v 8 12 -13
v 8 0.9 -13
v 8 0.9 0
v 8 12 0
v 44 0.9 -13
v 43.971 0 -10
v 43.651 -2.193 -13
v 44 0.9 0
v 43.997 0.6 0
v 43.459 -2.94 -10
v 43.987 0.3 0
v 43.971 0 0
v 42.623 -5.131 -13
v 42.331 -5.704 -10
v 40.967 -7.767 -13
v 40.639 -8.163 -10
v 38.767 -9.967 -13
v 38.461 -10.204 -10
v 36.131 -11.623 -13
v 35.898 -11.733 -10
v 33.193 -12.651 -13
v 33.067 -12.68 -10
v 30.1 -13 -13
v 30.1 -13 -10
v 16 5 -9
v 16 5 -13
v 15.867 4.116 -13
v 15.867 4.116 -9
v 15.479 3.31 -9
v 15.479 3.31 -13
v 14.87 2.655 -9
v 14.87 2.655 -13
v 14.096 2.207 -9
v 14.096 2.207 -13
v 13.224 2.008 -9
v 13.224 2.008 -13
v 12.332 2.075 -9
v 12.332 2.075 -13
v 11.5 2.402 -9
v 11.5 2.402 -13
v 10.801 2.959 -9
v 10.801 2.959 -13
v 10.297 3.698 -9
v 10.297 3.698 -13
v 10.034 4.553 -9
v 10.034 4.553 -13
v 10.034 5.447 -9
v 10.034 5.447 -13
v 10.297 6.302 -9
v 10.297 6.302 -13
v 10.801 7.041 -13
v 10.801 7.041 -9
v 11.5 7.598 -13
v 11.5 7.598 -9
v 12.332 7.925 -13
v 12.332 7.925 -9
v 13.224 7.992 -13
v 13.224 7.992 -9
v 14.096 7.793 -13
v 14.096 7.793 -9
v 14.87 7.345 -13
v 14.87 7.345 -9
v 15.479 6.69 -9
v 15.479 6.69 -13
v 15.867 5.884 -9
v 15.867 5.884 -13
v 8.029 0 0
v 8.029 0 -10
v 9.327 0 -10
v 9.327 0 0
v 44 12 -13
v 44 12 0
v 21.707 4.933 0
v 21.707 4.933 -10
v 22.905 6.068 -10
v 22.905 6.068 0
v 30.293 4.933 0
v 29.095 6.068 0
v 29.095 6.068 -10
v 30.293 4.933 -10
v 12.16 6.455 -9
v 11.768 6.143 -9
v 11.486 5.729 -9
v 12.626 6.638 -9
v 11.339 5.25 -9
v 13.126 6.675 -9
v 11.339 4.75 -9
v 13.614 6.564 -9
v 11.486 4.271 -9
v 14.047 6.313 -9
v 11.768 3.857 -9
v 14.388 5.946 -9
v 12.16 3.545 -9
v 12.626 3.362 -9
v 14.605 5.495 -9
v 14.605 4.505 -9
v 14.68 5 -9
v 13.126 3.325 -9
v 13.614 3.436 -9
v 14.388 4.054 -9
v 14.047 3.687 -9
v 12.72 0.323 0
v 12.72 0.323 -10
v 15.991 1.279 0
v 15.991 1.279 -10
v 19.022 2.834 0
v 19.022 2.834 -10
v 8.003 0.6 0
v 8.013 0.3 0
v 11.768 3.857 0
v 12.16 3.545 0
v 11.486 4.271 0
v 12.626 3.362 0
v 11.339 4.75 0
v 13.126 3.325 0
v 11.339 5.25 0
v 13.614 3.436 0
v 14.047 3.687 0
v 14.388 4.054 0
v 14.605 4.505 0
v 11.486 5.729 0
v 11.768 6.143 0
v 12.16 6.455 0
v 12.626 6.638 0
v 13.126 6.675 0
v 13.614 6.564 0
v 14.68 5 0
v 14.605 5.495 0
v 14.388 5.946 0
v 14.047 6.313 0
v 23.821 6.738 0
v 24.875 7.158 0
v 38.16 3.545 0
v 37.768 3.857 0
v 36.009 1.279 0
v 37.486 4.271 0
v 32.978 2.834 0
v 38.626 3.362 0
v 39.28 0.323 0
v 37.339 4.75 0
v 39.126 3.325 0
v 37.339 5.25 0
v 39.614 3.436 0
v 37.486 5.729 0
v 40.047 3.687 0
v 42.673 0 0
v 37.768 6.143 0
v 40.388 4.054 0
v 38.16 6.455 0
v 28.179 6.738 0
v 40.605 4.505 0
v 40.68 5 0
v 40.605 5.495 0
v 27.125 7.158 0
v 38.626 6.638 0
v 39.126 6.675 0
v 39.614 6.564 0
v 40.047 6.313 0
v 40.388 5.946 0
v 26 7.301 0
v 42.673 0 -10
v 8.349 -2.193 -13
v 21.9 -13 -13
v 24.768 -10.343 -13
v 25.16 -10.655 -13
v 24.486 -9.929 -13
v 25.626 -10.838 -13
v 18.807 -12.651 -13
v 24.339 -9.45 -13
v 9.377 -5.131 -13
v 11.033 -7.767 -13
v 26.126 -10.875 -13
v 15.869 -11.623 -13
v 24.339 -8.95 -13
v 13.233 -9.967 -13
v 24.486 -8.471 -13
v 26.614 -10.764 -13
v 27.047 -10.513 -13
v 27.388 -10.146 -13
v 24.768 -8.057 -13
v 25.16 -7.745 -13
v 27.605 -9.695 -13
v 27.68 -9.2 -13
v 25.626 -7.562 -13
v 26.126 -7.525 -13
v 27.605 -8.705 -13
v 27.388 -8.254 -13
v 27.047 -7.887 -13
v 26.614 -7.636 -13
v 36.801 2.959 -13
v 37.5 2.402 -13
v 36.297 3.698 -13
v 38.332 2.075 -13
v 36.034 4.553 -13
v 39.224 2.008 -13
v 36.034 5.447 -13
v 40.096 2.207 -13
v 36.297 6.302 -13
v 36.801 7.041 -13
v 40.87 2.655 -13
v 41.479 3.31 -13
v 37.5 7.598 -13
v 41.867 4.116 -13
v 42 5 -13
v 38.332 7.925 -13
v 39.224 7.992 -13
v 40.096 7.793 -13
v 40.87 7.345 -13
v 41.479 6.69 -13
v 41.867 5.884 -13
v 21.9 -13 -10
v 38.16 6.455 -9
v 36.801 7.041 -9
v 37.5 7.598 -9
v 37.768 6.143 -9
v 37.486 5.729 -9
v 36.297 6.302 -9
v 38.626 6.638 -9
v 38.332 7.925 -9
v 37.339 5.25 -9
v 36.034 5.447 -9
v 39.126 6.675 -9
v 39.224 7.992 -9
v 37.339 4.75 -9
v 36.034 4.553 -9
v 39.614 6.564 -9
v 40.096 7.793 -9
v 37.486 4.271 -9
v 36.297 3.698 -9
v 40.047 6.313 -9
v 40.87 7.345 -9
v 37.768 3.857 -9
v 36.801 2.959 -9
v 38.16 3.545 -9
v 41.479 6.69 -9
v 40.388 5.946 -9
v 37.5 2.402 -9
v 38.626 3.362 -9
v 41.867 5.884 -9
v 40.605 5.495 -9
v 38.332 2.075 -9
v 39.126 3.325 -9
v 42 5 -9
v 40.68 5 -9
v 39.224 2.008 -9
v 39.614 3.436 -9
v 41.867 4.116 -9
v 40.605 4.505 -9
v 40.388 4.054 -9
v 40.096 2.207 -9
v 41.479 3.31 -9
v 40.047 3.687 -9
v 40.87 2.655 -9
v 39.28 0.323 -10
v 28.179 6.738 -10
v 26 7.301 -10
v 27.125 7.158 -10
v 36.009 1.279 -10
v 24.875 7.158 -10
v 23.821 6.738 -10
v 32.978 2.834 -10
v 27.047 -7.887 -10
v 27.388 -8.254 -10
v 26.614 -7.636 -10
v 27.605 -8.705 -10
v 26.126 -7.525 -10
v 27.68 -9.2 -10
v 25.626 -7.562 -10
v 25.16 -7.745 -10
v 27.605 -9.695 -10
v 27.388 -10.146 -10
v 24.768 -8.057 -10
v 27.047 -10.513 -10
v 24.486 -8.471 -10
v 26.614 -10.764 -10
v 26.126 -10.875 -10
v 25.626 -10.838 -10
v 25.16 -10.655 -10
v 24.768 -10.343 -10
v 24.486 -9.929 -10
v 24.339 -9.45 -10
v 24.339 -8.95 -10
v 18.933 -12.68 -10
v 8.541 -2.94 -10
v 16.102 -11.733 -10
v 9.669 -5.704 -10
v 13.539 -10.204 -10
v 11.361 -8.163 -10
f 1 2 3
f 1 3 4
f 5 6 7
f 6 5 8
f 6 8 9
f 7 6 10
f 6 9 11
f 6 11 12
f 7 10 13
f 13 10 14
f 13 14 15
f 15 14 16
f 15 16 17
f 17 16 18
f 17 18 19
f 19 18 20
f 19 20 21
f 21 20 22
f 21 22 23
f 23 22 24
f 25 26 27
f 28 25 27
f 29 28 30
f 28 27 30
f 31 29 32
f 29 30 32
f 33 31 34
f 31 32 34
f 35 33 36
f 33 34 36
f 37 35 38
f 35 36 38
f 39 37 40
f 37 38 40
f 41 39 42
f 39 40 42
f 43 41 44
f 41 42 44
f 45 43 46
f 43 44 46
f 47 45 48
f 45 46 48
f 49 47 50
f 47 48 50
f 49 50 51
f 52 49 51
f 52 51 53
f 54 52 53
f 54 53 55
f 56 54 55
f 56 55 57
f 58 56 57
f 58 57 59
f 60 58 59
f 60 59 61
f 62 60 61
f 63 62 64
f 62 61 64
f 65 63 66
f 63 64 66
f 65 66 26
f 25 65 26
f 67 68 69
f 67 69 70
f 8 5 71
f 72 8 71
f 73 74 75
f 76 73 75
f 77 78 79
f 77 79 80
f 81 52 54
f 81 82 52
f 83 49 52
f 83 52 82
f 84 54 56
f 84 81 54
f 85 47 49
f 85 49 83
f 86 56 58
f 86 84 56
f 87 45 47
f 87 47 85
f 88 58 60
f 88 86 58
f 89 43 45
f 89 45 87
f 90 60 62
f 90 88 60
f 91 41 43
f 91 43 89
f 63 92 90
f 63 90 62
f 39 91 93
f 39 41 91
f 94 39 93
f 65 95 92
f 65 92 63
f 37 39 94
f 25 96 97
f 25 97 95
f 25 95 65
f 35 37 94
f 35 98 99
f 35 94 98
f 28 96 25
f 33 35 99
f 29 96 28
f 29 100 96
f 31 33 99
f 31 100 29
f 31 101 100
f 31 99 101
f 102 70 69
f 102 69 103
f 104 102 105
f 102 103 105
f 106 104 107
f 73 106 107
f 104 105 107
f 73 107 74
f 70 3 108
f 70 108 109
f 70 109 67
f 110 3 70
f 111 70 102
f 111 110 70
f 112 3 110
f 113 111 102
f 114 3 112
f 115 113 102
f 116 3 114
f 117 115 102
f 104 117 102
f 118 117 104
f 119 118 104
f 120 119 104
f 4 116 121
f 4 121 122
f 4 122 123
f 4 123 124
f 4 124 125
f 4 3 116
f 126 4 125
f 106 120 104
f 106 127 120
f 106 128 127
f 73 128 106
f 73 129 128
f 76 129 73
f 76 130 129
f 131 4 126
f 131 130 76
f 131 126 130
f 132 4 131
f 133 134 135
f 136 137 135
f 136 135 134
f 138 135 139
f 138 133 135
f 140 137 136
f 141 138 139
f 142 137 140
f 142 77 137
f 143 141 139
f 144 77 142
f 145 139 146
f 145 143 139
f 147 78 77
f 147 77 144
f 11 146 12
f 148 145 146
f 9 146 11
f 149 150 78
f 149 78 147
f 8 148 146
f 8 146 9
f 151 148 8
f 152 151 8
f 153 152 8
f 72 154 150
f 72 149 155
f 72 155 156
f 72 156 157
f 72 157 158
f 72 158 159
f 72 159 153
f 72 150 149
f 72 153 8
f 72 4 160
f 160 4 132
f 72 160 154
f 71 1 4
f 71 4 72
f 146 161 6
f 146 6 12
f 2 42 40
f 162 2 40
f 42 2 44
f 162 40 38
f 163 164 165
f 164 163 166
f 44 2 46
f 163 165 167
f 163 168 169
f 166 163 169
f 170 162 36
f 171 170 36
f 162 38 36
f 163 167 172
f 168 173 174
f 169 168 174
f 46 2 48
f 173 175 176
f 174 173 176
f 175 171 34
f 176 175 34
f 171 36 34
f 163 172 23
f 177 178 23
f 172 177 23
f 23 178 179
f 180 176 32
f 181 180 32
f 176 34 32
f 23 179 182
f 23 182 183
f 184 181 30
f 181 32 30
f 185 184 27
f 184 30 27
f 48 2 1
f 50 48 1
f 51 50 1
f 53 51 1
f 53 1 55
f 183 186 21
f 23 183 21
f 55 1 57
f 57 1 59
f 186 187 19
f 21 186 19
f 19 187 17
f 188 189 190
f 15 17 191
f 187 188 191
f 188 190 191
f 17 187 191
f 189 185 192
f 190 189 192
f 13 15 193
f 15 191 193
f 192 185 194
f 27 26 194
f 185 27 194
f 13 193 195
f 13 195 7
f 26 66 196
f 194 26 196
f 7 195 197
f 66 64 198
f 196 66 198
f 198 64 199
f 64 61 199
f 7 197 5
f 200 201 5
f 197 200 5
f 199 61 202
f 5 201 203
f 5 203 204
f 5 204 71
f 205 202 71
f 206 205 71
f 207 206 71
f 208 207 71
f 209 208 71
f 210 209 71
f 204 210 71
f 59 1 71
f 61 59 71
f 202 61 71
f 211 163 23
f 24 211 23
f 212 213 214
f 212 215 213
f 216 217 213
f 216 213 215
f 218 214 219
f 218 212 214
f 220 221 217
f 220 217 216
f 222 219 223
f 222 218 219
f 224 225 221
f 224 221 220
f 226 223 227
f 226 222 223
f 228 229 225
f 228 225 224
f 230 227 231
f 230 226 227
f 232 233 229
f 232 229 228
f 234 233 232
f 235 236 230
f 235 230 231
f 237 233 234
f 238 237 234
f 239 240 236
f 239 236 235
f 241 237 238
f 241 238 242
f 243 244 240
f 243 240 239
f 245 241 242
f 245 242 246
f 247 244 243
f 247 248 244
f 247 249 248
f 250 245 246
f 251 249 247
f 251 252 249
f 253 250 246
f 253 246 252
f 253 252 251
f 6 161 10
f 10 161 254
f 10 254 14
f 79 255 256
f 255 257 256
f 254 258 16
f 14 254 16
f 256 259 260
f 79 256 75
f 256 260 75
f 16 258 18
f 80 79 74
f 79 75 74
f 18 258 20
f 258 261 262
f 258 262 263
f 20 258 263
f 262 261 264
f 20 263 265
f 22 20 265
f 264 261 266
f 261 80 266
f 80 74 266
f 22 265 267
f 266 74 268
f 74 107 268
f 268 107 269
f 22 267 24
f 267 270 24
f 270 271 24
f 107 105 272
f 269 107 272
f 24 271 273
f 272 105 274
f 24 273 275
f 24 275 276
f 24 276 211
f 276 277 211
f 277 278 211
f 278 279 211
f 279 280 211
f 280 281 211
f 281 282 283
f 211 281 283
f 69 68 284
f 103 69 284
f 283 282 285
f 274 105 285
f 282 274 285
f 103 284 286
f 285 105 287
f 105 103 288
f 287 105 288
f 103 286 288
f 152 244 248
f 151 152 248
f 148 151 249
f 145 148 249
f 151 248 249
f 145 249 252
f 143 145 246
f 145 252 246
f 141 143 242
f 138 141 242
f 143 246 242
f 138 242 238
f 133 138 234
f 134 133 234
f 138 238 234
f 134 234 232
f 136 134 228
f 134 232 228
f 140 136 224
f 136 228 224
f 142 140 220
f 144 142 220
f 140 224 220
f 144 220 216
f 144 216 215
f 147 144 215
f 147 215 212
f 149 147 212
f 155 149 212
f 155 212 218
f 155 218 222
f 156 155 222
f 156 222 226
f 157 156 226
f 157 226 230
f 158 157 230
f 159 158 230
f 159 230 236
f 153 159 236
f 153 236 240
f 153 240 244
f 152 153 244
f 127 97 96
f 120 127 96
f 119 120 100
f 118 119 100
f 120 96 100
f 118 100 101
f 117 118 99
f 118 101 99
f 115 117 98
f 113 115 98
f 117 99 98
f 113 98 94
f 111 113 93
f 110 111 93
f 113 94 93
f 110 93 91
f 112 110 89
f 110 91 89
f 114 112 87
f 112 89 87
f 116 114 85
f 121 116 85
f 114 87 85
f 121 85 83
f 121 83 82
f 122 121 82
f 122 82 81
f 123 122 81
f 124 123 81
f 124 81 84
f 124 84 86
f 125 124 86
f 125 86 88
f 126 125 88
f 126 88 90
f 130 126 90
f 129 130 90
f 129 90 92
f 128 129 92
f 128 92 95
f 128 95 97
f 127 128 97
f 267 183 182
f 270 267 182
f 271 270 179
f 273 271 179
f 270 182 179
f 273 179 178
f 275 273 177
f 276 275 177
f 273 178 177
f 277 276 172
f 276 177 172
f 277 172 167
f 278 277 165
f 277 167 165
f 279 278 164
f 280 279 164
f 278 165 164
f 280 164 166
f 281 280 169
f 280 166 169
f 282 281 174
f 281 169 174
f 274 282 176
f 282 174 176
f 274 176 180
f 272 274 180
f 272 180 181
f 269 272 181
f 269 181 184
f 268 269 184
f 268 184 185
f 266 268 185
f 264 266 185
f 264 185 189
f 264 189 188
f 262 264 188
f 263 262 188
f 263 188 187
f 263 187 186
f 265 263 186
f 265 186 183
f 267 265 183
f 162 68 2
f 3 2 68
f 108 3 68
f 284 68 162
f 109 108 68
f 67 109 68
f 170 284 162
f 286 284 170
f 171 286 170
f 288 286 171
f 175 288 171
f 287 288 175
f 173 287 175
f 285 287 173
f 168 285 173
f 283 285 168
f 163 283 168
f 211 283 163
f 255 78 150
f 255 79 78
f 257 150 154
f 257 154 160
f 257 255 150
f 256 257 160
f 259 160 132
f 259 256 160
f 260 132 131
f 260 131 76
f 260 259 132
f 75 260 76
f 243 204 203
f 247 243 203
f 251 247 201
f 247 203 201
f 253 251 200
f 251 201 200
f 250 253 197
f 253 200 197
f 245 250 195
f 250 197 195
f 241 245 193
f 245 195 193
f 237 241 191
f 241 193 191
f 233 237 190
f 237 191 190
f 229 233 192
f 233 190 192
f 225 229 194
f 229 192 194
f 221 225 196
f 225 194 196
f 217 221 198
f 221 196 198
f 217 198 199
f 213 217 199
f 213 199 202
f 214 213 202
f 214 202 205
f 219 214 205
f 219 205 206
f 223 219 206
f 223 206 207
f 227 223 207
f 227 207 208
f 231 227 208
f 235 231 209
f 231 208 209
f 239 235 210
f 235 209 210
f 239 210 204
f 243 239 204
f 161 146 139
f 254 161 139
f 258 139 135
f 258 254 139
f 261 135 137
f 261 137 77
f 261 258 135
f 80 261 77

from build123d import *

# Parameters (mm, degrees)
BOX001_W        = 36
BOX001_H        = 25
BOX001_DEPTH    = 13
SKETCH_R        = 1.68
POCKET005_DEPTH = 13.001
SKETCH014_W     = 13
SKETCH014_H     = 10
POCKET006_DEPTH = 36.001
SKETCH015_R     = 3
POCKET007_DEPTH = 4
POCKET008_DEPTH = 10
FILLET_R        = 18
FILLET001_R     = 4.5
FILLET002_R     = 13.9


with BuildPart() as part:
    # Box001 → Box001 (new body)
    with BuildSketch(Plane(origin=(8, -13, -13), x_dir=(1, 0, 0), z_dir=(0, 0, 1))):
        with Locations((18, 12.5)):
            Rectangle(BOX001_W, BOX001_H)
    extrude(amount=BOX001_DEPTH)

    # Sketch → Pocket005 (cut, through all)
    with BuildSketch(Plane(origin=(8, -13, -13), x_dir=(1, 0, 0), z_dir=(0, 0, -1))):
        with Locations((31, -18)):
            Circle(SKETCH_R)
        with Locations((5, -18)):
            Circle(SKETCH_R)
        with Locations((18, -3.8)):
            Circle(SKETCH_R)
    extrude(amount=-POCKET005_DEPTH, mode=Mode.SUBTRACT)

    # Sketch014 → Pocket006 (cut, through all)
    with BuildSketch(Plane(origin=(8, -13, -13), x_dir=(0, -1, 0), z_dir=(-1, 0, 0))):
        with Locations((-6.5, 8)):
            Rectangle(SKETCH014_W, SKETCH014_H)
    extrude(amount=-POCKET006_DEPTH, mode=Mode.SUBTRACT)

    # Sketch015 → Pocket007 (cut)
    with BuildSketch(Plane(origin=(8, -13, -13), x_dir=(1, 0, 0), z_dir=(0, 0, -1))):
        with Locations((5, -18)):
            Circle(SKETCH015_R)
        with Locations((31, -18)):
            Circle(SKETCH015_R)
    extrude(amount=-POCKET007_DEPTH, mode=Mode.SUBTRACT)

    # Sketch016 → Pocket008 (cut)
    with BuildSketch(Plane(origin=(8, -13, 0), x_dir=(1, 0, 0), z_dir=(0, 0, 1))):
        Polygon((8.5, 13), (18, 22), (27.5, 13), align=None)
    extrude(amount=-POCKET008_DEPTH, mode=Mode.SUBTRACT)

    # Fillet
    fillet_edges = [part.edges().sort_by_distance(p)[0] for p in [
        (16.5, 0, -5),
        (35.5, 0, -5),
    ]]
    fillet(fillet_edges, radius=FILLET_R)

    # Fillet001
    fillet001_edges = [part.edges().sort_by_distance(p)[0] for p in [
        (26, 9, -5),
    ]]
    fillet(fillet001_edges, radius=FILLET001_R)

    # Fillet002
    fillet002_edges = [part.edges().sort_by_distance(p)[0] for p in [
        (44, -13, -11.5),
        (8, -13, -11.5),
    ]]
    fillet(fillet002_edges, radius=FILLET002_R)


solid = part.part
